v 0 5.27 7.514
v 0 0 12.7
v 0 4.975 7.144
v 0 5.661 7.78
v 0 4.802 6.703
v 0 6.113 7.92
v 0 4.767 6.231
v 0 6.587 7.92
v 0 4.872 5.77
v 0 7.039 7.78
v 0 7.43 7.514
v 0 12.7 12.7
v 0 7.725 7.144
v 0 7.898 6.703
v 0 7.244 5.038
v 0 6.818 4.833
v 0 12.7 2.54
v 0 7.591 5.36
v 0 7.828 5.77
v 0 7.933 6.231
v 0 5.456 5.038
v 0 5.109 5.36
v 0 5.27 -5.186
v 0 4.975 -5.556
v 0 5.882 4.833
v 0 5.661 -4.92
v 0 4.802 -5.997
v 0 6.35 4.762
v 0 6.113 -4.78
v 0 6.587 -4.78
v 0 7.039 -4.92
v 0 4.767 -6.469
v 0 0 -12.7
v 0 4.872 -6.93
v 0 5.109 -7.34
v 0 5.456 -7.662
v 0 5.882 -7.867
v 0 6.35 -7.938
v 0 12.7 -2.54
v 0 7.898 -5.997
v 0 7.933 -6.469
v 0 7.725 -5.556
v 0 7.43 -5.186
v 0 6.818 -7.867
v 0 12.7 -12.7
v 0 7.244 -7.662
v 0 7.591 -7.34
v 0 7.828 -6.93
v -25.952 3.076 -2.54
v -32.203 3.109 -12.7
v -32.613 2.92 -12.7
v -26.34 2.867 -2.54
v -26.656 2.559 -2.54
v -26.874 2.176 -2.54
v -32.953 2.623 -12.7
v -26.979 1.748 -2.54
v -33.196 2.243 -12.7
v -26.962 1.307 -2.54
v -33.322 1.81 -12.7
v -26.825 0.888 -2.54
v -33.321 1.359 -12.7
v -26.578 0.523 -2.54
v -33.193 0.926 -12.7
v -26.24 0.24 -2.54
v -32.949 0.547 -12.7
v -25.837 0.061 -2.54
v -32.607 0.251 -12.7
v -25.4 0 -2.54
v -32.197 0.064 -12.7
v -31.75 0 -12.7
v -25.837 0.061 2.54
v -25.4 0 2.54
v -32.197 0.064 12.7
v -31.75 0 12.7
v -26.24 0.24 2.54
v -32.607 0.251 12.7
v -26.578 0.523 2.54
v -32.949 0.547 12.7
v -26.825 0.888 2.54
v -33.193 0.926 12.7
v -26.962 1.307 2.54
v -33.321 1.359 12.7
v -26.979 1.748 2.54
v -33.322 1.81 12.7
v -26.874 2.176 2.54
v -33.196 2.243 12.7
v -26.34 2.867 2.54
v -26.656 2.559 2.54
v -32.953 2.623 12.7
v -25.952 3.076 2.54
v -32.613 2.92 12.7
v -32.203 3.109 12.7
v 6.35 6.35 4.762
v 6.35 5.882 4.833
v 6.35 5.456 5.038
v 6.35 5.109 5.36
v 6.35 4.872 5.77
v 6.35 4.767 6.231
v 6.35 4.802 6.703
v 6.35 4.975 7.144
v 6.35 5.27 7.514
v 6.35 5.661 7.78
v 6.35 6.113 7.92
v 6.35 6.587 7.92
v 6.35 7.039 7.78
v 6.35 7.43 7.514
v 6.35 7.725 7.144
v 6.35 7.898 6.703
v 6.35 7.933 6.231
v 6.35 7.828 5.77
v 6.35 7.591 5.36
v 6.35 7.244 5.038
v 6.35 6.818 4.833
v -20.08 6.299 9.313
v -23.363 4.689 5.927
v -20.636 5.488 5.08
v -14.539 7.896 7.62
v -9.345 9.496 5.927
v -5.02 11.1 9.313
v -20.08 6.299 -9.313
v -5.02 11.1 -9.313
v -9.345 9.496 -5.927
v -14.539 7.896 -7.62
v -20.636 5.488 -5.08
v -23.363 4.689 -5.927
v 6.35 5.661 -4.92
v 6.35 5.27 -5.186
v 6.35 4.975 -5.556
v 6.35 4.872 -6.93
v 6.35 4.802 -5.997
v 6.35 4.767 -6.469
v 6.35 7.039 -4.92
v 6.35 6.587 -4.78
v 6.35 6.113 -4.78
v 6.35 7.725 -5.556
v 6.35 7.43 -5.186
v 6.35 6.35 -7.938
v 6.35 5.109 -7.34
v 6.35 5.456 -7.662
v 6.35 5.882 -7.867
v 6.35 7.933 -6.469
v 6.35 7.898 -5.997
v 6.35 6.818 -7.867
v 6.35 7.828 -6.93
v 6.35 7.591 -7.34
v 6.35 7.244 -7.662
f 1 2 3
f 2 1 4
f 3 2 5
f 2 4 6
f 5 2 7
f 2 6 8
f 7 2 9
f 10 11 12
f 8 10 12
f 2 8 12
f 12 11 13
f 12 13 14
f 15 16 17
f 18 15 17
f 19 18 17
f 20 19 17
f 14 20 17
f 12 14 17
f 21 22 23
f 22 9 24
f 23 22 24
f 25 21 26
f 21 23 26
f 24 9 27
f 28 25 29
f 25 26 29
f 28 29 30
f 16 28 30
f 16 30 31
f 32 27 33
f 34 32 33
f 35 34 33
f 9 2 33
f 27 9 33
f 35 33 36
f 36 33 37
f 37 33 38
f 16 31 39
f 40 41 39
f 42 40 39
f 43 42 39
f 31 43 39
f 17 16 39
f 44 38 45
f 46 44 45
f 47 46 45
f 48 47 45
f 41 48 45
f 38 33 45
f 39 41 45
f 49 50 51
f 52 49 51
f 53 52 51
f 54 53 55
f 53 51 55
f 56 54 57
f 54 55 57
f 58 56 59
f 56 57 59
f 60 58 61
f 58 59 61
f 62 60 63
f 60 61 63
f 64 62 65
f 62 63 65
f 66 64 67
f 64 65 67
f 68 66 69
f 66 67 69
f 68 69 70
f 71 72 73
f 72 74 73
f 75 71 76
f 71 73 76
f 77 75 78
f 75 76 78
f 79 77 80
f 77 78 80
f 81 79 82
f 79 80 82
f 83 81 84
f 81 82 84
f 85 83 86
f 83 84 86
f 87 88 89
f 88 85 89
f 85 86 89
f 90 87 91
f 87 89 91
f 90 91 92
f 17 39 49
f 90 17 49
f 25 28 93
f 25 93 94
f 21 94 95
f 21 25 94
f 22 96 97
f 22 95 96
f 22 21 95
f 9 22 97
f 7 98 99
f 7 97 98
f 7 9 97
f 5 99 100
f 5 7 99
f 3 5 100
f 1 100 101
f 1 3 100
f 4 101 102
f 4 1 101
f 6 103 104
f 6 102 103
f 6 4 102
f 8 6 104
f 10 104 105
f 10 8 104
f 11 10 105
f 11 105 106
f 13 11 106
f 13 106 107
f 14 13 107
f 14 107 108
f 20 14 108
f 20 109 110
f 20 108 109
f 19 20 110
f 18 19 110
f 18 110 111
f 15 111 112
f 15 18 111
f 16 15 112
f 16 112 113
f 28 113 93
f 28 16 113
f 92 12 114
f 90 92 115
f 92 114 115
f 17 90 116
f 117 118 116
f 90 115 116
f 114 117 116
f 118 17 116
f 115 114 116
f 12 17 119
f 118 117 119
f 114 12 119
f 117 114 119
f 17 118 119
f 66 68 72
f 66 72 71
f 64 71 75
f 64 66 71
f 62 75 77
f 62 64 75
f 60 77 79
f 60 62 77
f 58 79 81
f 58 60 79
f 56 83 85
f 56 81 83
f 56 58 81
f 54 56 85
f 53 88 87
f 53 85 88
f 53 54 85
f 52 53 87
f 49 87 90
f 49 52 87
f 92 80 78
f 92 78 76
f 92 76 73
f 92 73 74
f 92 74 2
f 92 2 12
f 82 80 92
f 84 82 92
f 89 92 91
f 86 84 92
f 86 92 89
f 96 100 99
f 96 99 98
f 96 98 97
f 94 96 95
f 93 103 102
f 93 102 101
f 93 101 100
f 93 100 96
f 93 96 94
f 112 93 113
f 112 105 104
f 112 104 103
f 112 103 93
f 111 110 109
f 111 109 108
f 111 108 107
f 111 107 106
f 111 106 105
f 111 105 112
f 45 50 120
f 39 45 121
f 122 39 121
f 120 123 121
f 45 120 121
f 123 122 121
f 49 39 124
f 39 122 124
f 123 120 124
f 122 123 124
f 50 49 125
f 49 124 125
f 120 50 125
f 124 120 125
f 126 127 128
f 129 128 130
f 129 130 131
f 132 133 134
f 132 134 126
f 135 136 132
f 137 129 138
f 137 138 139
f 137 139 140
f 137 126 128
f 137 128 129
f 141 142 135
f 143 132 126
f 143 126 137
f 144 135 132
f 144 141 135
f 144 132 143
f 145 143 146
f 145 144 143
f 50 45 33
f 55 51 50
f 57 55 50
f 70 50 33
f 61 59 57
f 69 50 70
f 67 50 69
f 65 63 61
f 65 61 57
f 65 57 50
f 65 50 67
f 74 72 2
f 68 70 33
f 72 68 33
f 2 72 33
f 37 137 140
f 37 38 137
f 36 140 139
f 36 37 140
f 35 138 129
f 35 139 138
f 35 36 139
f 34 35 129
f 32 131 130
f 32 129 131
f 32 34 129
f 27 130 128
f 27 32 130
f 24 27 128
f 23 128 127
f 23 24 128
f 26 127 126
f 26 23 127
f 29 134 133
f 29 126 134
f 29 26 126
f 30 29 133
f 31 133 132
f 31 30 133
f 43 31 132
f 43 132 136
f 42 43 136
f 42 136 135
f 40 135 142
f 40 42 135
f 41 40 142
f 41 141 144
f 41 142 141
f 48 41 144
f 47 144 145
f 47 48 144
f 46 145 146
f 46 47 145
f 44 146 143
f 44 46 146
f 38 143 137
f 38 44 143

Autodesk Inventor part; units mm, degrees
ref_plane "YZ Plane" through (0, 0, 0) normal (1, 0, 0) x (0, 1, 0)
sketch "Sketch1" plane through (0, 0, 0) normal (0, 0, 1) x (1, 0, 0)
  line L0 (0, 0) -> (0, 12.7)
  line L1 (0, 12.7) -> (-25.952, 3.0759)
  line L2 (0, 0) -> (-25.4, 0)
  arc A0 (-25.952, 3.0759) -> (-25.4, 0) centre (-25.4, 1.5875) ccw
  dimension "d0" = 25.4
  dimension "d1" = 3.175
  dimension "d2" = 12.7
extrude "Extrusion1" add sketch "Sketch1" along normal mid plane 5.08
ref_plane "Work Plane1" through (0, 0, 12.7) normal (0, 0, 1) x (1, 0, 0)
sketch "Sketch2" plane through (0, 0, 12.7) normal (0, 0, 1) x (1, 0, 0)
  arc A0 (-32.2031, 3.109) -> (-31.75, 0) centre (-31.75, 1.5875) ccw
  line L0 (0, 0) -> (-31.75, 0)
  line L1 (0, 0) -> (0, 12.7)
  line L2 (0, 12.7) -> (-32.2031, 3.109)
  line L3 (0, 12.7) -> (-25.952, 3.0759) construction
  dimension "d6" = 3.175
  dimension "d7" = 31.75
ref_plane "Work Plane2" through (0, 0, -12.7) normal (0, 0, -1) x (-1, 0, 0)
sketch "Sketch3" plane through (0, 0, -12.7) normal (0, 0, -1) x (-1, 0, 0)
  line L0 (0, 12.7) -> (32.2031, 3.109) projected
  arc A0 (31.75, 0) -> (32.2031, 3.109) centre (31.75, 1.5875) ccw projected
  line L1 (0, 0) -> (31.75, 0) projected
  line L2 (0, 0) -> (0, 12.7) projected
loft "Loft1" add profiles "Sketch2" section 1 edges at (0, 6.35, 2.54) (-12.976, 7.888, 2.54) (-26.9625, 1.3071, 2.54) (-12.7, 0, 2.54)
loft "Loft2" add profiles "Sketch3" section 1 edges at (0, 6.35, -2.54) (-12.7, 0, -2.54) (-26.9625, 1.3071, -2.54) (-12.976, 7.888, -2.54)
sketch "Sketch4" plane through (0, 0, 12.7) normal (1, 0, 0) x (0, 0, -1)
  line L0 (15.24, 12.7) -> (10.16, 12.7) construction
  line L1 (10.16, 12.7) -> (0, 12.7) construction
  line L2 (0, 12.7) -> (0, 0) construction
  line L3 (0, 0) -> (25.4, 0) construction
  line L4 (25.4, 0) -> (25.4, 12.7) construction
  line L5 (15.24, 12.7) -> (25.4, 12.7) construction
  line L6 (0, 12.7) -> (12.7, 0) construction
  line L7 (12.7, 0) -> (25.4, 12.7) construction
  circle A0 centre (6.35, 6.35) radius 1.5875
  circle A1 centre (19.05, 6.35) radius 1.5875
  dimension "d17" = 3.175
  dimension "d18" = 3.175
extrude "Extrusion2" add sketch "Sketch4" along normal blind 6.35
properties part number "Bottom Pivot Mk1"
